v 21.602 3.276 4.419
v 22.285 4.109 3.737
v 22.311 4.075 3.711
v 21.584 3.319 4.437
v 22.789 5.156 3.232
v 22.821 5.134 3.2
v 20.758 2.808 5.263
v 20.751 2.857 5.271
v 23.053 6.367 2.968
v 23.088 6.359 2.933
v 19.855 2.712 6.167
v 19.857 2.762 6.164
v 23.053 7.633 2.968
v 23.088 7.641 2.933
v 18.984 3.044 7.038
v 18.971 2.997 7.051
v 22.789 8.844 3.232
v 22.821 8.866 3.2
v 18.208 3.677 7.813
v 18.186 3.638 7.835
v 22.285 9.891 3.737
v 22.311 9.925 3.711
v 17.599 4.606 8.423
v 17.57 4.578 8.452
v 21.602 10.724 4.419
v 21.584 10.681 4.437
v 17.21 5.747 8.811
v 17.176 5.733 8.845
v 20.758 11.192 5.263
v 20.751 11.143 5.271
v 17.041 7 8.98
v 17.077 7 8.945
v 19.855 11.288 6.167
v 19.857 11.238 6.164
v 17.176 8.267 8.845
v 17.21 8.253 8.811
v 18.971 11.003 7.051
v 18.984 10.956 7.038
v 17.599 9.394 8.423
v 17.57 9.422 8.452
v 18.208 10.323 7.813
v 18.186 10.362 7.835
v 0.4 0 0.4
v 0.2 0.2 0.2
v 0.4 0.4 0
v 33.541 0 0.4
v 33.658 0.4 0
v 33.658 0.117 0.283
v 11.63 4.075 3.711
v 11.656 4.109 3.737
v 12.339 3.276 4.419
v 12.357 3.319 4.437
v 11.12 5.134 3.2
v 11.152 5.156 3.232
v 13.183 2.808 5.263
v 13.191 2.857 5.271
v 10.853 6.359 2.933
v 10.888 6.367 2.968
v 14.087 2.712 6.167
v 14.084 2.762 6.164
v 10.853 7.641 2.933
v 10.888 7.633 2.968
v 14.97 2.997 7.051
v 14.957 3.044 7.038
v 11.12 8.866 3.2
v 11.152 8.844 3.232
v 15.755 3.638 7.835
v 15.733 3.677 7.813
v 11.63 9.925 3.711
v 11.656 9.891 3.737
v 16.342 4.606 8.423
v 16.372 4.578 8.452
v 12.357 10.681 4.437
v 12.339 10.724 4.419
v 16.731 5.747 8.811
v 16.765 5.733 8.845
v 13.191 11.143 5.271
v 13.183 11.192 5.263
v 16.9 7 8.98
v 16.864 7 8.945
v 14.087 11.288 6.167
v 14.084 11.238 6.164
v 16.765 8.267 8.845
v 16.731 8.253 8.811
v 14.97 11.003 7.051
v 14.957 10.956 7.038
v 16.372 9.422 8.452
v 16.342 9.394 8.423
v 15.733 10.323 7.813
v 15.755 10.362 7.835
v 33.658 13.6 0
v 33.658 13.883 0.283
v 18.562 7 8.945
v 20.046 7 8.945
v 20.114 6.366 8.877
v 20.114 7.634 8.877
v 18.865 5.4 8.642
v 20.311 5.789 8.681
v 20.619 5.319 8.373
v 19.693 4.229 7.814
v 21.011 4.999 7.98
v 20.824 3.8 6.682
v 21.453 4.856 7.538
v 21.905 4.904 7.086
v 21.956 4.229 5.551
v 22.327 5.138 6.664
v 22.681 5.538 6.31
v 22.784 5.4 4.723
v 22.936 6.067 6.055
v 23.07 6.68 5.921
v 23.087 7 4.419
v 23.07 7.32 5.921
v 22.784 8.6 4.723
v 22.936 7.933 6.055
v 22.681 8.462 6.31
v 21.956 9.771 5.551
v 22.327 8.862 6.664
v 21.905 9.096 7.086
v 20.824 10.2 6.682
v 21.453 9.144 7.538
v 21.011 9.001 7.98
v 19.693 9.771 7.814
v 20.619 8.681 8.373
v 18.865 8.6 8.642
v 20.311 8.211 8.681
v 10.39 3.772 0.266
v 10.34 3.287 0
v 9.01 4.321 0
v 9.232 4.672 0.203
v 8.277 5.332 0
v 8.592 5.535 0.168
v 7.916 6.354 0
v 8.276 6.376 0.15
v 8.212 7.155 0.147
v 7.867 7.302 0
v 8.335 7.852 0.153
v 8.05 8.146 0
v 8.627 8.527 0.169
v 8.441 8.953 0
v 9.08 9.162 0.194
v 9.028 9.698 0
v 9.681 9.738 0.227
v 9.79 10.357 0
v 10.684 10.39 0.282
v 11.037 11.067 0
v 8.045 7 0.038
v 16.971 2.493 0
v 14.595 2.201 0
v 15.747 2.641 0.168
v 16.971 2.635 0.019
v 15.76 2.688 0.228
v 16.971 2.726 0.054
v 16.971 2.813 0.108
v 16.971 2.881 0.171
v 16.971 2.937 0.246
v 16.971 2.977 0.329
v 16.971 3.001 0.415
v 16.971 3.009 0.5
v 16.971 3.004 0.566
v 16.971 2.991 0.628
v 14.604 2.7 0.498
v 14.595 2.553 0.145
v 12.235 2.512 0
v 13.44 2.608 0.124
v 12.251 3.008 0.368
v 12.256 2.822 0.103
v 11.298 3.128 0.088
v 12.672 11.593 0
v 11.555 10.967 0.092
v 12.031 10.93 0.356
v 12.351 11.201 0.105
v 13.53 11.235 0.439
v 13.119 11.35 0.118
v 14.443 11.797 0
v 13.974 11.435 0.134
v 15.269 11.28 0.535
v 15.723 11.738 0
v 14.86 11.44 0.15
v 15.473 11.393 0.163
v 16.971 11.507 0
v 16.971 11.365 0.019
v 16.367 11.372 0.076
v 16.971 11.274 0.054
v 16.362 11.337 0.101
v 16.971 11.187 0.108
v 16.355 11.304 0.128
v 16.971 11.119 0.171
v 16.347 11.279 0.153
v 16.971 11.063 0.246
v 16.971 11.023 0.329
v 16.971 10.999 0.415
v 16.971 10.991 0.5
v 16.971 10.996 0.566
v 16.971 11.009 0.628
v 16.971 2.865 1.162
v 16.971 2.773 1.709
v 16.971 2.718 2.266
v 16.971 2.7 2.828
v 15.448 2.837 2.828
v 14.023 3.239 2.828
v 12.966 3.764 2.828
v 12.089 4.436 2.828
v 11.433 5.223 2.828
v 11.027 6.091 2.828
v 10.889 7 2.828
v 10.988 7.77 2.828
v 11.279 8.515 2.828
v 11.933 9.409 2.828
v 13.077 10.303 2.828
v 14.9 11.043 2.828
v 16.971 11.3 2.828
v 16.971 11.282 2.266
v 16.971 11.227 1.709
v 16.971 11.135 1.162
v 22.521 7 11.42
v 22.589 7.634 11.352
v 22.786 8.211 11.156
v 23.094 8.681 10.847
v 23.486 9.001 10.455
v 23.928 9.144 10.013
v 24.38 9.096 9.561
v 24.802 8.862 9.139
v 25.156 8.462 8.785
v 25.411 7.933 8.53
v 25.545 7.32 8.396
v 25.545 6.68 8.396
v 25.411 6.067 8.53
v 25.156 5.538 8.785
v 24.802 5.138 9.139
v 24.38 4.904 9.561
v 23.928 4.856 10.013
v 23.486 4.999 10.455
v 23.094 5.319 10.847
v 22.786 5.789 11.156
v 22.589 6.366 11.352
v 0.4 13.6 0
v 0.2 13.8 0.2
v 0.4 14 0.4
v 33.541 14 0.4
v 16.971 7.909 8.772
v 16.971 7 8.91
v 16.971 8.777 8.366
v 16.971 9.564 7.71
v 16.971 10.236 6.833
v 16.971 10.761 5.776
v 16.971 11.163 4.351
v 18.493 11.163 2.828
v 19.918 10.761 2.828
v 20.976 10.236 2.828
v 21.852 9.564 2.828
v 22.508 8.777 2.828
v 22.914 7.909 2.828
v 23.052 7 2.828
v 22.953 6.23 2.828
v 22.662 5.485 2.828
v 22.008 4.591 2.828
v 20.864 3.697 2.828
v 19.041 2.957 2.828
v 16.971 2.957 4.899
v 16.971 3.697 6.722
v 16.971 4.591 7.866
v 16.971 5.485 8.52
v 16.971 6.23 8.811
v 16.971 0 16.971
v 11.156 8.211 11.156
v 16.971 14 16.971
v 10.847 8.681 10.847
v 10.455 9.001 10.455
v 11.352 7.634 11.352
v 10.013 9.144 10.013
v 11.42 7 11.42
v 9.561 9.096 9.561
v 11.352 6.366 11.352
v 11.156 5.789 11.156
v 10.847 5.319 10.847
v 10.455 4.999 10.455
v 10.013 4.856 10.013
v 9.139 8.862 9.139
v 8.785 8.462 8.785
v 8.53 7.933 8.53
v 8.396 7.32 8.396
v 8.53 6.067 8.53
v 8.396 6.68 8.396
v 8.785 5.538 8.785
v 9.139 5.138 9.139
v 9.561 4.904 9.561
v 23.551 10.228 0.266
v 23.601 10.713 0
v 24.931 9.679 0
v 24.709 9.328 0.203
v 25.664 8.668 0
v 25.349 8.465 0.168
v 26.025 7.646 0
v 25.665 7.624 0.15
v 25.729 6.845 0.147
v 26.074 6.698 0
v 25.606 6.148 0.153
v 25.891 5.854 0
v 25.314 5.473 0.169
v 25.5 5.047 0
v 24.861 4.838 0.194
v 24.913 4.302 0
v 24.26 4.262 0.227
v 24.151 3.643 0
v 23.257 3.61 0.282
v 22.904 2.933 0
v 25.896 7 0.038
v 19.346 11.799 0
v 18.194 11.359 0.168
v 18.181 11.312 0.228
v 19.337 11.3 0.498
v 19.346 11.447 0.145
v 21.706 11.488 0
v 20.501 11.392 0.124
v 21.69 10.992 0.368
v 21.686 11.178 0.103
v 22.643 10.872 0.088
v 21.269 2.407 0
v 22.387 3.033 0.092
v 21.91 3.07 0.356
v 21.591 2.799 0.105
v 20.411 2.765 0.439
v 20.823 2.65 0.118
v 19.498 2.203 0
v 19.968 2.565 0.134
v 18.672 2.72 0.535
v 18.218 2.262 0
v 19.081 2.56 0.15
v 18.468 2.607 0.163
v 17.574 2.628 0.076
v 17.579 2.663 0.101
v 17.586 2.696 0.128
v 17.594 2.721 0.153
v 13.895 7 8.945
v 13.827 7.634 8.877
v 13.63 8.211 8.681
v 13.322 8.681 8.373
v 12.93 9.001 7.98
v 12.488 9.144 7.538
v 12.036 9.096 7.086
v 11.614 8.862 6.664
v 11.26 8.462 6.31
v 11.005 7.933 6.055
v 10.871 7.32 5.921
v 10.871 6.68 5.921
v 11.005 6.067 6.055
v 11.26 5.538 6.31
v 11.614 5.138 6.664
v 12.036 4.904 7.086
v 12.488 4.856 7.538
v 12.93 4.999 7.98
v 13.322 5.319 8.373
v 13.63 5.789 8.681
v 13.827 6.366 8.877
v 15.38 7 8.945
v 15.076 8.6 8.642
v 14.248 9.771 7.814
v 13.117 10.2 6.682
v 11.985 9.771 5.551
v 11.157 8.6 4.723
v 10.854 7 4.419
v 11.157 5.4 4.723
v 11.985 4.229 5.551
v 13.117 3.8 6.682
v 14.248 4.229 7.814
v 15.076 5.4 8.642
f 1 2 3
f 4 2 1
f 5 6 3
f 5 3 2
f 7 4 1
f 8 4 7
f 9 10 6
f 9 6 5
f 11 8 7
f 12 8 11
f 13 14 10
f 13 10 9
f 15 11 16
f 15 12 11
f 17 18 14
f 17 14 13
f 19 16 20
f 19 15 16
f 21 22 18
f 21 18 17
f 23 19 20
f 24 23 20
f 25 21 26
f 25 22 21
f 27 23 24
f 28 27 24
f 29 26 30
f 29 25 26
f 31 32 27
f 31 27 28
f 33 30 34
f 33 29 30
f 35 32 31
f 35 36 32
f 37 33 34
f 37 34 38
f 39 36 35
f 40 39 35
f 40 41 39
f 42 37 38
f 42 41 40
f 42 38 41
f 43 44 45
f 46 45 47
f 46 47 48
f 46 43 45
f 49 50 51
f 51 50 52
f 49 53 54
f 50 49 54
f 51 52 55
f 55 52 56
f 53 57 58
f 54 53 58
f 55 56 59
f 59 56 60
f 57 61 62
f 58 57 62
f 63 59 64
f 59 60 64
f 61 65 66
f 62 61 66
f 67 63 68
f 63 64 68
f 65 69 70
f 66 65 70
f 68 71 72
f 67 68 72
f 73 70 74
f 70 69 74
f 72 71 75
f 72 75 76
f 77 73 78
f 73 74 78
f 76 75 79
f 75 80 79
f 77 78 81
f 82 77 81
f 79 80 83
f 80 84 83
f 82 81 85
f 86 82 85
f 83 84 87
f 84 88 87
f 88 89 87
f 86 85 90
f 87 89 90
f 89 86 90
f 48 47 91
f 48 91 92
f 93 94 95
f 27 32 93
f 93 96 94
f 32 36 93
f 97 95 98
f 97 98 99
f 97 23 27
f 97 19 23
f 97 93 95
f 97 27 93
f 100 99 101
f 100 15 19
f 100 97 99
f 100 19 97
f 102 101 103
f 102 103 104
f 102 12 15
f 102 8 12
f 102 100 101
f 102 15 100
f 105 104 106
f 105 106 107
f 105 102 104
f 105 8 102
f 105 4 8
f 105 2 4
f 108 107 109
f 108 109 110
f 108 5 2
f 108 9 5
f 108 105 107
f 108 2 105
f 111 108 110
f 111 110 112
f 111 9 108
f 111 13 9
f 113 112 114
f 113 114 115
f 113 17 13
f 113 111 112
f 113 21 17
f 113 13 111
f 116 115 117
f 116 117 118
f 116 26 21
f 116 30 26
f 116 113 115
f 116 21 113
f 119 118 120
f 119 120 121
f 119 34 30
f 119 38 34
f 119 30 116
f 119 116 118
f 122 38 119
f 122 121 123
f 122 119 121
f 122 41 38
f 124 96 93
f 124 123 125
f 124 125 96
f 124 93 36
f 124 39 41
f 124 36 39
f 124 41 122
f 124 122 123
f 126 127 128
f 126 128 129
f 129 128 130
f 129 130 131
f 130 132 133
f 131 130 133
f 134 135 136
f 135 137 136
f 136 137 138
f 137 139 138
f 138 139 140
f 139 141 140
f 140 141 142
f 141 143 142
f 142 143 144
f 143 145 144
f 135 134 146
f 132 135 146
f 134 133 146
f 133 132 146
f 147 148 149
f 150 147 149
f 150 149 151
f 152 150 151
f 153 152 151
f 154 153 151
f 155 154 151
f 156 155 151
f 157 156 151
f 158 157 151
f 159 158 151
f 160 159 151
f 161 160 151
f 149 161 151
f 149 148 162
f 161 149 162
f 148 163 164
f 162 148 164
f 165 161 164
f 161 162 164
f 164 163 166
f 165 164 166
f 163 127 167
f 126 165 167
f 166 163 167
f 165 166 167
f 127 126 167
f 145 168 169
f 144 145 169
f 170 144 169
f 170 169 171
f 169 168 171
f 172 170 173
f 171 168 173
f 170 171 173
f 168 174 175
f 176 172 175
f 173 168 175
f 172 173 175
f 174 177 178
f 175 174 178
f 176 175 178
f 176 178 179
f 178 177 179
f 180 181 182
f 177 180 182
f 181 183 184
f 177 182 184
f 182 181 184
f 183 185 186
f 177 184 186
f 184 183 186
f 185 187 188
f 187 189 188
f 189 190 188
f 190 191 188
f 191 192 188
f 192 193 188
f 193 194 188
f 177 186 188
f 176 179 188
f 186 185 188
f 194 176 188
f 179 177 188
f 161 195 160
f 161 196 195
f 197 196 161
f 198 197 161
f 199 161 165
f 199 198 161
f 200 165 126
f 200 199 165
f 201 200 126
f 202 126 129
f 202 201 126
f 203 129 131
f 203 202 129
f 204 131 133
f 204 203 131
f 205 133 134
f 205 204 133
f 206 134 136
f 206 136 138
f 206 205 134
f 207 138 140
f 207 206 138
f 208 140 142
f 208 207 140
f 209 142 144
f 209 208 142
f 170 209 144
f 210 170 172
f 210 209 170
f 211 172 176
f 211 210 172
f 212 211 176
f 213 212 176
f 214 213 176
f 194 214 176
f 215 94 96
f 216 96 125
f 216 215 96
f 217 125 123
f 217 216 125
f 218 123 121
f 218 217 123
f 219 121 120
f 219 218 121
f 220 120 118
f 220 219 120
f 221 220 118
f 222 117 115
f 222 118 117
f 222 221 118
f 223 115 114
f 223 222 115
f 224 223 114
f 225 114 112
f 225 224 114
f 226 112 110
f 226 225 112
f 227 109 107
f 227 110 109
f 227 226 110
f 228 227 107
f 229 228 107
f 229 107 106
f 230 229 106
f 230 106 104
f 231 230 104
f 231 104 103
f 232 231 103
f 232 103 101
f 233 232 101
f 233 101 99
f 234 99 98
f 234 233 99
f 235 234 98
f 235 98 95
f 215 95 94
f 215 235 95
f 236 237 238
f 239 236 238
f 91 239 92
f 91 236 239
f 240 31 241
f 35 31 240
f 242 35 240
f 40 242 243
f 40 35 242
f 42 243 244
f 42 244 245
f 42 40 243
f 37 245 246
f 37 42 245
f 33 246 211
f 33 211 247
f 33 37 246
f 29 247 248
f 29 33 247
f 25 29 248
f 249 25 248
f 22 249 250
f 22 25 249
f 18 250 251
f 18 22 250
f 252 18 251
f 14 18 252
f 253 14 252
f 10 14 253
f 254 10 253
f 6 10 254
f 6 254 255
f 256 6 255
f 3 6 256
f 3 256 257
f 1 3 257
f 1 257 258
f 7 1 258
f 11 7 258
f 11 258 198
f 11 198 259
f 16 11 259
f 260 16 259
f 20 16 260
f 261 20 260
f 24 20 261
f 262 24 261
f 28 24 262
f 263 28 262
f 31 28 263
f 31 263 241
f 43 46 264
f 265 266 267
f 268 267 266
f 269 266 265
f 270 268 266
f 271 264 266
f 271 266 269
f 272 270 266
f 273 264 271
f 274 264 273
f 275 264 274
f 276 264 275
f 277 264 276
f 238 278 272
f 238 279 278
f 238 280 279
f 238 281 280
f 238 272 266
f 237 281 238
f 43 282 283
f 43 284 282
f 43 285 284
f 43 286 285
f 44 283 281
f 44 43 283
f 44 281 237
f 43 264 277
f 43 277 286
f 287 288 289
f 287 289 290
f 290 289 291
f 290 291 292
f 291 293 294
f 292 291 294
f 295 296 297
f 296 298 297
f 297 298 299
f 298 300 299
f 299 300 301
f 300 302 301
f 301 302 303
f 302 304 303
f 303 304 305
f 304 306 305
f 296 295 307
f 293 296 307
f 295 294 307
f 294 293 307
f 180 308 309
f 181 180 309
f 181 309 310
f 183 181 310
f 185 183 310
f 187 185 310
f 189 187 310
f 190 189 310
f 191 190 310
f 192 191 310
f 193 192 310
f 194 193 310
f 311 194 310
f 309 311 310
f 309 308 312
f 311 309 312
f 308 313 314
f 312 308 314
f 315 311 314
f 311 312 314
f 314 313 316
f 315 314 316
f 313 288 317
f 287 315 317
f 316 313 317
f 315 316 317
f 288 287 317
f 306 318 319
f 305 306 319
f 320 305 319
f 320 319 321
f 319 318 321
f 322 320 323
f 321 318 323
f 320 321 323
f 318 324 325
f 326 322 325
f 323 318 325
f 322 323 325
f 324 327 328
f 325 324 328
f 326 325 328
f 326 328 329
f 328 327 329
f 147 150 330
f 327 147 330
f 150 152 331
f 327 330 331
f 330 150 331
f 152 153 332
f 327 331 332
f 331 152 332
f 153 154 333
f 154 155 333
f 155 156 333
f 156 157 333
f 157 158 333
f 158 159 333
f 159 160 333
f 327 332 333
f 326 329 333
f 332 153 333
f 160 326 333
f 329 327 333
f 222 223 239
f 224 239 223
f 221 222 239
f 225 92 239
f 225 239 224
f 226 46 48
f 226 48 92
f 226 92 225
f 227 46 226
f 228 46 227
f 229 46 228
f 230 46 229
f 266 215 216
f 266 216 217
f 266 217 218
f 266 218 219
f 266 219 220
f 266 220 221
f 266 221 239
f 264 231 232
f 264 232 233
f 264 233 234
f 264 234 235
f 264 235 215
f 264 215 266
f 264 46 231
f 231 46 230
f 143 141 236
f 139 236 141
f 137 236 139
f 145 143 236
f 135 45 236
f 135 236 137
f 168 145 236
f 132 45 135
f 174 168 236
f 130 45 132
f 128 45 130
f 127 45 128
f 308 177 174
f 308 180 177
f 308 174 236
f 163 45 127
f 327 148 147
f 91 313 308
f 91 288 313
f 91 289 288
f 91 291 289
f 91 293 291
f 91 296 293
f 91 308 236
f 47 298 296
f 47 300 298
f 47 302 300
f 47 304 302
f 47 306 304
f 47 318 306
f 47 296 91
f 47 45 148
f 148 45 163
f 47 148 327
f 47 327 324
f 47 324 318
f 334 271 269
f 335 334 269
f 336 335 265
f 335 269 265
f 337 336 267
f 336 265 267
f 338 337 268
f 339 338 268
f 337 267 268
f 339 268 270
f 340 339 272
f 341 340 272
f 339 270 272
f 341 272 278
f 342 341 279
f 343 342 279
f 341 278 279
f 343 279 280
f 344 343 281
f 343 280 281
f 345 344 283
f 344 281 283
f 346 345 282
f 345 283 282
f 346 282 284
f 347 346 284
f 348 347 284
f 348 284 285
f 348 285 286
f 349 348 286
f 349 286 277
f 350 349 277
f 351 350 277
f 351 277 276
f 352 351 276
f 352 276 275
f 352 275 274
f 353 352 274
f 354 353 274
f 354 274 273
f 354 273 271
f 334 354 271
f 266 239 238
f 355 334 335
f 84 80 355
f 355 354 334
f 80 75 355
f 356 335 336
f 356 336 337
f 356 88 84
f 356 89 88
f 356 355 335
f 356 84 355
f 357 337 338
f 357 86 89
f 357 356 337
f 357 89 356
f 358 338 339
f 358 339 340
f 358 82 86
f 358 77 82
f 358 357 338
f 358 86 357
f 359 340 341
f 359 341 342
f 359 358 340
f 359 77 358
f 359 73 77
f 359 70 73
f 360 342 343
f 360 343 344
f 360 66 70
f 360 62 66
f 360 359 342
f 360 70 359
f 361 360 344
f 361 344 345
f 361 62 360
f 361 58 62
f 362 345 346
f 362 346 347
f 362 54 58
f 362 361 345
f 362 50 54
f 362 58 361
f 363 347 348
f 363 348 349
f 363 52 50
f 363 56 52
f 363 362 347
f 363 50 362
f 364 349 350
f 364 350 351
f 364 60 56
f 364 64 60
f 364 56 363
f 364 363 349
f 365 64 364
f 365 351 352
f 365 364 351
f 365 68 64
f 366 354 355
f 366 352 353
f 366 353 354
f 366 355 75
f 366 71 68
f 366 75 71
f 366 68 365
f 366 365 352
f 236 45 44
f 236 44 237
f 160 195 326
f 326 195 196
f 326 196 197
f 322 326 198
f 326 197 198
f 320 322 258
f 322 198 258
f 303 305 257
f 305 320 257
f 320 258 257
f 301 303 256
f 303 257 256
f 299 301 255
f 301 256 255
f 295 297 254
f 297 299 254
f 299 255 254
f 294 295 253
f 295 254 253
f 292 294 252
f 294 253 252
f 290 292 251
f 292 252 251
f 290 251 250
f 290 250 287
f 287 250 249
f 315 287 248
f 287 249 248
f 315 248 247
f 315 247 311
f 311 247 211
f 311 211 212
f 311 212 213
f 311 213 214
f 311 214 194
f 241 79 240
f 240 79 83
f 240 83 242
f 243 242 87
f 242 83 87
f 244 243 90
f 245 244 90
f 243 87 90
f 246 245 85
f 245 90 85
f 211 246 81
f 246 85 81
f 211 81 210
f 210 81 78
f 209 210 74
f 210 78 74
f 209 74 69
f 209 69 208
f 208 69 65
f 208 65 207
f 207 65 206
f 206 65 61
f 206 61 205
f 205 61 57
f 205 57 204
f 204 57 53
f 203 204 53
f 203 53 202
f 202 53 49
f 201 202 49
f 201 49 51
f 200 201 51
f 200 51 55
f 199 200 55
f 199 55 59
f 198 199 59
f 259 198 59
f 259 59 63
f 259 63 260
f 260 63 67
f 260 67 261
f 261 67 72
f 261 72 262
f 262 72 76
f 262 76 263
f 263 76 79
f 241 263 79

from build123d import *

# Parameters (mm, degrees)
BOSS_EXTRUDE1_DEPTH   = 14
SKETCH2_R             = 2.15
CUT_EXTRUDE1_DEPTH    = 25
CUT_EXTRUDE2_START    = -5.6
SKETCH3_R             = 4.3
CUT_EXTRUDE2_DEPTH    = 19.4
CHAMFER1_SIZE         = 2.1
CHAMFER2_SIZE         = 0.4
CHAMFER2_EDGE_2_SIZE  = 0.4
CHAMFER2_EDGE_3_SIZE2 = 0.4
CHAMFER2_EDGE_3_SIZE  = 0.282842712
CHAMFER2_EDGE_4_SIZE2 = 0.282842712
CHAMFER2_EDGE_4_SIZE  = 0.4
FILLET1_R             = 0.5


with BuildPart() as part:
    # Sketch1 → Boss-Extrude1 (new body)
    with BuildSketch(Plane(origin=(0, 0, 0), x_dir=(1, 0, 0), z_dir=(0, 1, 0))):
        Polygon((0, 0), (33.941125497, 0), (16.970562748, -16.970562748), align=None)
    extrude(amount=BOSS_EXTRUDE1_DEPTH)

    # Sketch2 → Cut-Extrude1 (cut, through all)
    with BuildSketch(Plane(origin=(0, 0, 0), x_dir=(0.707106781, 0, 0.707106781), z_dir=(-0.707106781, 0, 0.707106781))):
        with Locations((14, 7)):
            Circle(SKETCH2_R)
    cut_extrude1 = extrude(amount=-CUT_EXTRUDE1_DEPTH, mode=Mode.SUBTRACT)

    # Sketch3 → Cut-Extrude2 (cut, through all)
    with BuildSketch(Plane(origin=(0, 0, 0), x_dir=(0.707106781, 0, 0.707106781), z_dir=(-0.707106781, 0, 0.707106781)).offset(CUT_EXTRUDE2_START)):
        with Locations((14, 7)):
            Circle(SKETCH3_R)
    cut_extrude2 = extrude(amount=-CUT_EXTRUDE2_DEPTH, mode=Mode.SUBTRACT)

    # Mirror1: Cut-Extrude1, Cut-Extrude2 across plane
    add(cut_extrude1.mirror(Plane(origin=(16.970562748, 0, 0), x_dir=(0, 0, 1), z_dir=(1, 0, 0))), mode=Mode.SUBTRACT)
    add(cut_extrude2.mirror(Plane(origin=(16.970562748, 0, 0), x_dir=(0, 0, 1), z_dir=(1, 0, 0))), mode=Mode.SUBTRACT)

    # Chamfer1
    chamfer1_edges = [part.edges().sort_by_distance(p)[0] for p in [
        (12.339013332, 7, 4.419417382),
        (21.602112165, 7, 4.419417382),
    ]]
    chamfer(chamfer1_edges, length=CHAMFER1_SIZE)

    # Chamfer2
    chamfer2_edges = [part.edges().sort_by_distance(p)[0] for p in [
        (16.970562748, 14, 0),
    ]]
    chamfer(chamfer2_edges, length=CHAMFER2_SIZE)

    # Chamfer2 edge 2
    chamfer2_edge_2_edges = [part.edges().sort_by_distance(p)[0] for p in [
        (16.970562748, 0, 0),
    ]]
    chamfer(chamfer2_edge_2_edges, length=CHAMFER2_EDGE_2_SIZE)

    # Chamfer2 edge 3
    chamfer2_edge_3_edges = [part.edges().sort_by_distance(p)[0] for p in [
        (0, 7, 0),
    ]]
    chamfer(chamfer2_edge_3_edges, length=CHAMFER2_EDGE_3_SIZE, length2=CHAMFER2_EDGE_3_SIZE2)

    # Chamfer2 edge 4
    chamfer2_edge_4_edges = [part.edges().sort_by_distance(p)[0] for p in [
        (33.941125497, 7, 0),
    ]]
    chamfer(chamfer2_edge_4_edges, length=CHAMFER2_EDGE_4_SIZE, length2=CHAMFER2_EDGE_4_SIZE2)

    # Fillet1
    fillet1_edges = [part.edges().sort_by_distance(p)[0] for p in [
        (11.523443743, 3.119120407, 0),
        (22.417681754, 3.119120407, 0),
    ]]
    fillet(fillet1_edges, radius=FILLET1_R)


solid = part.part
